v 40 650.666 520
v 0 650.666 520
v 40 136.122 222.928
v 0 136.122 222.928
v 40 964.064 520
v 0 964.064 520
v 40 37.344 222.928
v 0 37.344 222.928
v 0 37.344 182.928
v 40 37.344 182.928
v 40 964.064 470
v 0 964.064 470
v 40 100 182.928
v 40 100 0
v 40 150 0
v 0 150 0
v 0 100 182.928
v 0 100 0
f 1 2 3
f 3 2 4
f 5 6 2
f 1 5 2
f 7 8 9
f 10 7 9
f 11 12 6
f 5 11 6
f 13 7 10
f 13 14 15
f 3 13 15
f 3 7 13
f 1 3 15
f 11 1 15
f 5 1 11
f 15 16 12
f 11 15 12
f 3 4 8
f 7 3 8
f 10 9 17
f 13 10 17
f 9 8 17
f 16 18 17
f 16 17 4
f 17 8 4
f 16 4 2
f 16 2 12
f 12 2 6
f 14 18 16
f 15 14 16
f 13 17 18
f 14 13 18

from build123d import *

# Parameters (mm, degrees)
F1_DEPTH = 40


with BuildPart() as f1:
    # F0 (on Right) → F1 (new body)
    with BuildSketch(Plane.YZ):
        Polygon((100, 182.927519083), (100, 202.0725942164), (136.1217894571, 222.927519083), (37.343967706, 222.927519083), (37.343967706, 182.927519083), align=None)
        Polygon((136.1217894571, 222.927519083), (100, 202.0725942164), (100, 182.927519083), (357.343967706, 182.927519083), (357.343967706, 222.927519083), align=None)
        Polygon((650.6664199358, 520), (136.1217894571, 222.927519083), (357.343967706, 222.927519083), (357.343967706, 182.927519083), (100, 182.927519083), (100, 0), (150, 0), (964.0638795574, 470), (964.0638795574, 520), align=None)
    extrude(amount=F1_DEPTH)


solid = f1.part
